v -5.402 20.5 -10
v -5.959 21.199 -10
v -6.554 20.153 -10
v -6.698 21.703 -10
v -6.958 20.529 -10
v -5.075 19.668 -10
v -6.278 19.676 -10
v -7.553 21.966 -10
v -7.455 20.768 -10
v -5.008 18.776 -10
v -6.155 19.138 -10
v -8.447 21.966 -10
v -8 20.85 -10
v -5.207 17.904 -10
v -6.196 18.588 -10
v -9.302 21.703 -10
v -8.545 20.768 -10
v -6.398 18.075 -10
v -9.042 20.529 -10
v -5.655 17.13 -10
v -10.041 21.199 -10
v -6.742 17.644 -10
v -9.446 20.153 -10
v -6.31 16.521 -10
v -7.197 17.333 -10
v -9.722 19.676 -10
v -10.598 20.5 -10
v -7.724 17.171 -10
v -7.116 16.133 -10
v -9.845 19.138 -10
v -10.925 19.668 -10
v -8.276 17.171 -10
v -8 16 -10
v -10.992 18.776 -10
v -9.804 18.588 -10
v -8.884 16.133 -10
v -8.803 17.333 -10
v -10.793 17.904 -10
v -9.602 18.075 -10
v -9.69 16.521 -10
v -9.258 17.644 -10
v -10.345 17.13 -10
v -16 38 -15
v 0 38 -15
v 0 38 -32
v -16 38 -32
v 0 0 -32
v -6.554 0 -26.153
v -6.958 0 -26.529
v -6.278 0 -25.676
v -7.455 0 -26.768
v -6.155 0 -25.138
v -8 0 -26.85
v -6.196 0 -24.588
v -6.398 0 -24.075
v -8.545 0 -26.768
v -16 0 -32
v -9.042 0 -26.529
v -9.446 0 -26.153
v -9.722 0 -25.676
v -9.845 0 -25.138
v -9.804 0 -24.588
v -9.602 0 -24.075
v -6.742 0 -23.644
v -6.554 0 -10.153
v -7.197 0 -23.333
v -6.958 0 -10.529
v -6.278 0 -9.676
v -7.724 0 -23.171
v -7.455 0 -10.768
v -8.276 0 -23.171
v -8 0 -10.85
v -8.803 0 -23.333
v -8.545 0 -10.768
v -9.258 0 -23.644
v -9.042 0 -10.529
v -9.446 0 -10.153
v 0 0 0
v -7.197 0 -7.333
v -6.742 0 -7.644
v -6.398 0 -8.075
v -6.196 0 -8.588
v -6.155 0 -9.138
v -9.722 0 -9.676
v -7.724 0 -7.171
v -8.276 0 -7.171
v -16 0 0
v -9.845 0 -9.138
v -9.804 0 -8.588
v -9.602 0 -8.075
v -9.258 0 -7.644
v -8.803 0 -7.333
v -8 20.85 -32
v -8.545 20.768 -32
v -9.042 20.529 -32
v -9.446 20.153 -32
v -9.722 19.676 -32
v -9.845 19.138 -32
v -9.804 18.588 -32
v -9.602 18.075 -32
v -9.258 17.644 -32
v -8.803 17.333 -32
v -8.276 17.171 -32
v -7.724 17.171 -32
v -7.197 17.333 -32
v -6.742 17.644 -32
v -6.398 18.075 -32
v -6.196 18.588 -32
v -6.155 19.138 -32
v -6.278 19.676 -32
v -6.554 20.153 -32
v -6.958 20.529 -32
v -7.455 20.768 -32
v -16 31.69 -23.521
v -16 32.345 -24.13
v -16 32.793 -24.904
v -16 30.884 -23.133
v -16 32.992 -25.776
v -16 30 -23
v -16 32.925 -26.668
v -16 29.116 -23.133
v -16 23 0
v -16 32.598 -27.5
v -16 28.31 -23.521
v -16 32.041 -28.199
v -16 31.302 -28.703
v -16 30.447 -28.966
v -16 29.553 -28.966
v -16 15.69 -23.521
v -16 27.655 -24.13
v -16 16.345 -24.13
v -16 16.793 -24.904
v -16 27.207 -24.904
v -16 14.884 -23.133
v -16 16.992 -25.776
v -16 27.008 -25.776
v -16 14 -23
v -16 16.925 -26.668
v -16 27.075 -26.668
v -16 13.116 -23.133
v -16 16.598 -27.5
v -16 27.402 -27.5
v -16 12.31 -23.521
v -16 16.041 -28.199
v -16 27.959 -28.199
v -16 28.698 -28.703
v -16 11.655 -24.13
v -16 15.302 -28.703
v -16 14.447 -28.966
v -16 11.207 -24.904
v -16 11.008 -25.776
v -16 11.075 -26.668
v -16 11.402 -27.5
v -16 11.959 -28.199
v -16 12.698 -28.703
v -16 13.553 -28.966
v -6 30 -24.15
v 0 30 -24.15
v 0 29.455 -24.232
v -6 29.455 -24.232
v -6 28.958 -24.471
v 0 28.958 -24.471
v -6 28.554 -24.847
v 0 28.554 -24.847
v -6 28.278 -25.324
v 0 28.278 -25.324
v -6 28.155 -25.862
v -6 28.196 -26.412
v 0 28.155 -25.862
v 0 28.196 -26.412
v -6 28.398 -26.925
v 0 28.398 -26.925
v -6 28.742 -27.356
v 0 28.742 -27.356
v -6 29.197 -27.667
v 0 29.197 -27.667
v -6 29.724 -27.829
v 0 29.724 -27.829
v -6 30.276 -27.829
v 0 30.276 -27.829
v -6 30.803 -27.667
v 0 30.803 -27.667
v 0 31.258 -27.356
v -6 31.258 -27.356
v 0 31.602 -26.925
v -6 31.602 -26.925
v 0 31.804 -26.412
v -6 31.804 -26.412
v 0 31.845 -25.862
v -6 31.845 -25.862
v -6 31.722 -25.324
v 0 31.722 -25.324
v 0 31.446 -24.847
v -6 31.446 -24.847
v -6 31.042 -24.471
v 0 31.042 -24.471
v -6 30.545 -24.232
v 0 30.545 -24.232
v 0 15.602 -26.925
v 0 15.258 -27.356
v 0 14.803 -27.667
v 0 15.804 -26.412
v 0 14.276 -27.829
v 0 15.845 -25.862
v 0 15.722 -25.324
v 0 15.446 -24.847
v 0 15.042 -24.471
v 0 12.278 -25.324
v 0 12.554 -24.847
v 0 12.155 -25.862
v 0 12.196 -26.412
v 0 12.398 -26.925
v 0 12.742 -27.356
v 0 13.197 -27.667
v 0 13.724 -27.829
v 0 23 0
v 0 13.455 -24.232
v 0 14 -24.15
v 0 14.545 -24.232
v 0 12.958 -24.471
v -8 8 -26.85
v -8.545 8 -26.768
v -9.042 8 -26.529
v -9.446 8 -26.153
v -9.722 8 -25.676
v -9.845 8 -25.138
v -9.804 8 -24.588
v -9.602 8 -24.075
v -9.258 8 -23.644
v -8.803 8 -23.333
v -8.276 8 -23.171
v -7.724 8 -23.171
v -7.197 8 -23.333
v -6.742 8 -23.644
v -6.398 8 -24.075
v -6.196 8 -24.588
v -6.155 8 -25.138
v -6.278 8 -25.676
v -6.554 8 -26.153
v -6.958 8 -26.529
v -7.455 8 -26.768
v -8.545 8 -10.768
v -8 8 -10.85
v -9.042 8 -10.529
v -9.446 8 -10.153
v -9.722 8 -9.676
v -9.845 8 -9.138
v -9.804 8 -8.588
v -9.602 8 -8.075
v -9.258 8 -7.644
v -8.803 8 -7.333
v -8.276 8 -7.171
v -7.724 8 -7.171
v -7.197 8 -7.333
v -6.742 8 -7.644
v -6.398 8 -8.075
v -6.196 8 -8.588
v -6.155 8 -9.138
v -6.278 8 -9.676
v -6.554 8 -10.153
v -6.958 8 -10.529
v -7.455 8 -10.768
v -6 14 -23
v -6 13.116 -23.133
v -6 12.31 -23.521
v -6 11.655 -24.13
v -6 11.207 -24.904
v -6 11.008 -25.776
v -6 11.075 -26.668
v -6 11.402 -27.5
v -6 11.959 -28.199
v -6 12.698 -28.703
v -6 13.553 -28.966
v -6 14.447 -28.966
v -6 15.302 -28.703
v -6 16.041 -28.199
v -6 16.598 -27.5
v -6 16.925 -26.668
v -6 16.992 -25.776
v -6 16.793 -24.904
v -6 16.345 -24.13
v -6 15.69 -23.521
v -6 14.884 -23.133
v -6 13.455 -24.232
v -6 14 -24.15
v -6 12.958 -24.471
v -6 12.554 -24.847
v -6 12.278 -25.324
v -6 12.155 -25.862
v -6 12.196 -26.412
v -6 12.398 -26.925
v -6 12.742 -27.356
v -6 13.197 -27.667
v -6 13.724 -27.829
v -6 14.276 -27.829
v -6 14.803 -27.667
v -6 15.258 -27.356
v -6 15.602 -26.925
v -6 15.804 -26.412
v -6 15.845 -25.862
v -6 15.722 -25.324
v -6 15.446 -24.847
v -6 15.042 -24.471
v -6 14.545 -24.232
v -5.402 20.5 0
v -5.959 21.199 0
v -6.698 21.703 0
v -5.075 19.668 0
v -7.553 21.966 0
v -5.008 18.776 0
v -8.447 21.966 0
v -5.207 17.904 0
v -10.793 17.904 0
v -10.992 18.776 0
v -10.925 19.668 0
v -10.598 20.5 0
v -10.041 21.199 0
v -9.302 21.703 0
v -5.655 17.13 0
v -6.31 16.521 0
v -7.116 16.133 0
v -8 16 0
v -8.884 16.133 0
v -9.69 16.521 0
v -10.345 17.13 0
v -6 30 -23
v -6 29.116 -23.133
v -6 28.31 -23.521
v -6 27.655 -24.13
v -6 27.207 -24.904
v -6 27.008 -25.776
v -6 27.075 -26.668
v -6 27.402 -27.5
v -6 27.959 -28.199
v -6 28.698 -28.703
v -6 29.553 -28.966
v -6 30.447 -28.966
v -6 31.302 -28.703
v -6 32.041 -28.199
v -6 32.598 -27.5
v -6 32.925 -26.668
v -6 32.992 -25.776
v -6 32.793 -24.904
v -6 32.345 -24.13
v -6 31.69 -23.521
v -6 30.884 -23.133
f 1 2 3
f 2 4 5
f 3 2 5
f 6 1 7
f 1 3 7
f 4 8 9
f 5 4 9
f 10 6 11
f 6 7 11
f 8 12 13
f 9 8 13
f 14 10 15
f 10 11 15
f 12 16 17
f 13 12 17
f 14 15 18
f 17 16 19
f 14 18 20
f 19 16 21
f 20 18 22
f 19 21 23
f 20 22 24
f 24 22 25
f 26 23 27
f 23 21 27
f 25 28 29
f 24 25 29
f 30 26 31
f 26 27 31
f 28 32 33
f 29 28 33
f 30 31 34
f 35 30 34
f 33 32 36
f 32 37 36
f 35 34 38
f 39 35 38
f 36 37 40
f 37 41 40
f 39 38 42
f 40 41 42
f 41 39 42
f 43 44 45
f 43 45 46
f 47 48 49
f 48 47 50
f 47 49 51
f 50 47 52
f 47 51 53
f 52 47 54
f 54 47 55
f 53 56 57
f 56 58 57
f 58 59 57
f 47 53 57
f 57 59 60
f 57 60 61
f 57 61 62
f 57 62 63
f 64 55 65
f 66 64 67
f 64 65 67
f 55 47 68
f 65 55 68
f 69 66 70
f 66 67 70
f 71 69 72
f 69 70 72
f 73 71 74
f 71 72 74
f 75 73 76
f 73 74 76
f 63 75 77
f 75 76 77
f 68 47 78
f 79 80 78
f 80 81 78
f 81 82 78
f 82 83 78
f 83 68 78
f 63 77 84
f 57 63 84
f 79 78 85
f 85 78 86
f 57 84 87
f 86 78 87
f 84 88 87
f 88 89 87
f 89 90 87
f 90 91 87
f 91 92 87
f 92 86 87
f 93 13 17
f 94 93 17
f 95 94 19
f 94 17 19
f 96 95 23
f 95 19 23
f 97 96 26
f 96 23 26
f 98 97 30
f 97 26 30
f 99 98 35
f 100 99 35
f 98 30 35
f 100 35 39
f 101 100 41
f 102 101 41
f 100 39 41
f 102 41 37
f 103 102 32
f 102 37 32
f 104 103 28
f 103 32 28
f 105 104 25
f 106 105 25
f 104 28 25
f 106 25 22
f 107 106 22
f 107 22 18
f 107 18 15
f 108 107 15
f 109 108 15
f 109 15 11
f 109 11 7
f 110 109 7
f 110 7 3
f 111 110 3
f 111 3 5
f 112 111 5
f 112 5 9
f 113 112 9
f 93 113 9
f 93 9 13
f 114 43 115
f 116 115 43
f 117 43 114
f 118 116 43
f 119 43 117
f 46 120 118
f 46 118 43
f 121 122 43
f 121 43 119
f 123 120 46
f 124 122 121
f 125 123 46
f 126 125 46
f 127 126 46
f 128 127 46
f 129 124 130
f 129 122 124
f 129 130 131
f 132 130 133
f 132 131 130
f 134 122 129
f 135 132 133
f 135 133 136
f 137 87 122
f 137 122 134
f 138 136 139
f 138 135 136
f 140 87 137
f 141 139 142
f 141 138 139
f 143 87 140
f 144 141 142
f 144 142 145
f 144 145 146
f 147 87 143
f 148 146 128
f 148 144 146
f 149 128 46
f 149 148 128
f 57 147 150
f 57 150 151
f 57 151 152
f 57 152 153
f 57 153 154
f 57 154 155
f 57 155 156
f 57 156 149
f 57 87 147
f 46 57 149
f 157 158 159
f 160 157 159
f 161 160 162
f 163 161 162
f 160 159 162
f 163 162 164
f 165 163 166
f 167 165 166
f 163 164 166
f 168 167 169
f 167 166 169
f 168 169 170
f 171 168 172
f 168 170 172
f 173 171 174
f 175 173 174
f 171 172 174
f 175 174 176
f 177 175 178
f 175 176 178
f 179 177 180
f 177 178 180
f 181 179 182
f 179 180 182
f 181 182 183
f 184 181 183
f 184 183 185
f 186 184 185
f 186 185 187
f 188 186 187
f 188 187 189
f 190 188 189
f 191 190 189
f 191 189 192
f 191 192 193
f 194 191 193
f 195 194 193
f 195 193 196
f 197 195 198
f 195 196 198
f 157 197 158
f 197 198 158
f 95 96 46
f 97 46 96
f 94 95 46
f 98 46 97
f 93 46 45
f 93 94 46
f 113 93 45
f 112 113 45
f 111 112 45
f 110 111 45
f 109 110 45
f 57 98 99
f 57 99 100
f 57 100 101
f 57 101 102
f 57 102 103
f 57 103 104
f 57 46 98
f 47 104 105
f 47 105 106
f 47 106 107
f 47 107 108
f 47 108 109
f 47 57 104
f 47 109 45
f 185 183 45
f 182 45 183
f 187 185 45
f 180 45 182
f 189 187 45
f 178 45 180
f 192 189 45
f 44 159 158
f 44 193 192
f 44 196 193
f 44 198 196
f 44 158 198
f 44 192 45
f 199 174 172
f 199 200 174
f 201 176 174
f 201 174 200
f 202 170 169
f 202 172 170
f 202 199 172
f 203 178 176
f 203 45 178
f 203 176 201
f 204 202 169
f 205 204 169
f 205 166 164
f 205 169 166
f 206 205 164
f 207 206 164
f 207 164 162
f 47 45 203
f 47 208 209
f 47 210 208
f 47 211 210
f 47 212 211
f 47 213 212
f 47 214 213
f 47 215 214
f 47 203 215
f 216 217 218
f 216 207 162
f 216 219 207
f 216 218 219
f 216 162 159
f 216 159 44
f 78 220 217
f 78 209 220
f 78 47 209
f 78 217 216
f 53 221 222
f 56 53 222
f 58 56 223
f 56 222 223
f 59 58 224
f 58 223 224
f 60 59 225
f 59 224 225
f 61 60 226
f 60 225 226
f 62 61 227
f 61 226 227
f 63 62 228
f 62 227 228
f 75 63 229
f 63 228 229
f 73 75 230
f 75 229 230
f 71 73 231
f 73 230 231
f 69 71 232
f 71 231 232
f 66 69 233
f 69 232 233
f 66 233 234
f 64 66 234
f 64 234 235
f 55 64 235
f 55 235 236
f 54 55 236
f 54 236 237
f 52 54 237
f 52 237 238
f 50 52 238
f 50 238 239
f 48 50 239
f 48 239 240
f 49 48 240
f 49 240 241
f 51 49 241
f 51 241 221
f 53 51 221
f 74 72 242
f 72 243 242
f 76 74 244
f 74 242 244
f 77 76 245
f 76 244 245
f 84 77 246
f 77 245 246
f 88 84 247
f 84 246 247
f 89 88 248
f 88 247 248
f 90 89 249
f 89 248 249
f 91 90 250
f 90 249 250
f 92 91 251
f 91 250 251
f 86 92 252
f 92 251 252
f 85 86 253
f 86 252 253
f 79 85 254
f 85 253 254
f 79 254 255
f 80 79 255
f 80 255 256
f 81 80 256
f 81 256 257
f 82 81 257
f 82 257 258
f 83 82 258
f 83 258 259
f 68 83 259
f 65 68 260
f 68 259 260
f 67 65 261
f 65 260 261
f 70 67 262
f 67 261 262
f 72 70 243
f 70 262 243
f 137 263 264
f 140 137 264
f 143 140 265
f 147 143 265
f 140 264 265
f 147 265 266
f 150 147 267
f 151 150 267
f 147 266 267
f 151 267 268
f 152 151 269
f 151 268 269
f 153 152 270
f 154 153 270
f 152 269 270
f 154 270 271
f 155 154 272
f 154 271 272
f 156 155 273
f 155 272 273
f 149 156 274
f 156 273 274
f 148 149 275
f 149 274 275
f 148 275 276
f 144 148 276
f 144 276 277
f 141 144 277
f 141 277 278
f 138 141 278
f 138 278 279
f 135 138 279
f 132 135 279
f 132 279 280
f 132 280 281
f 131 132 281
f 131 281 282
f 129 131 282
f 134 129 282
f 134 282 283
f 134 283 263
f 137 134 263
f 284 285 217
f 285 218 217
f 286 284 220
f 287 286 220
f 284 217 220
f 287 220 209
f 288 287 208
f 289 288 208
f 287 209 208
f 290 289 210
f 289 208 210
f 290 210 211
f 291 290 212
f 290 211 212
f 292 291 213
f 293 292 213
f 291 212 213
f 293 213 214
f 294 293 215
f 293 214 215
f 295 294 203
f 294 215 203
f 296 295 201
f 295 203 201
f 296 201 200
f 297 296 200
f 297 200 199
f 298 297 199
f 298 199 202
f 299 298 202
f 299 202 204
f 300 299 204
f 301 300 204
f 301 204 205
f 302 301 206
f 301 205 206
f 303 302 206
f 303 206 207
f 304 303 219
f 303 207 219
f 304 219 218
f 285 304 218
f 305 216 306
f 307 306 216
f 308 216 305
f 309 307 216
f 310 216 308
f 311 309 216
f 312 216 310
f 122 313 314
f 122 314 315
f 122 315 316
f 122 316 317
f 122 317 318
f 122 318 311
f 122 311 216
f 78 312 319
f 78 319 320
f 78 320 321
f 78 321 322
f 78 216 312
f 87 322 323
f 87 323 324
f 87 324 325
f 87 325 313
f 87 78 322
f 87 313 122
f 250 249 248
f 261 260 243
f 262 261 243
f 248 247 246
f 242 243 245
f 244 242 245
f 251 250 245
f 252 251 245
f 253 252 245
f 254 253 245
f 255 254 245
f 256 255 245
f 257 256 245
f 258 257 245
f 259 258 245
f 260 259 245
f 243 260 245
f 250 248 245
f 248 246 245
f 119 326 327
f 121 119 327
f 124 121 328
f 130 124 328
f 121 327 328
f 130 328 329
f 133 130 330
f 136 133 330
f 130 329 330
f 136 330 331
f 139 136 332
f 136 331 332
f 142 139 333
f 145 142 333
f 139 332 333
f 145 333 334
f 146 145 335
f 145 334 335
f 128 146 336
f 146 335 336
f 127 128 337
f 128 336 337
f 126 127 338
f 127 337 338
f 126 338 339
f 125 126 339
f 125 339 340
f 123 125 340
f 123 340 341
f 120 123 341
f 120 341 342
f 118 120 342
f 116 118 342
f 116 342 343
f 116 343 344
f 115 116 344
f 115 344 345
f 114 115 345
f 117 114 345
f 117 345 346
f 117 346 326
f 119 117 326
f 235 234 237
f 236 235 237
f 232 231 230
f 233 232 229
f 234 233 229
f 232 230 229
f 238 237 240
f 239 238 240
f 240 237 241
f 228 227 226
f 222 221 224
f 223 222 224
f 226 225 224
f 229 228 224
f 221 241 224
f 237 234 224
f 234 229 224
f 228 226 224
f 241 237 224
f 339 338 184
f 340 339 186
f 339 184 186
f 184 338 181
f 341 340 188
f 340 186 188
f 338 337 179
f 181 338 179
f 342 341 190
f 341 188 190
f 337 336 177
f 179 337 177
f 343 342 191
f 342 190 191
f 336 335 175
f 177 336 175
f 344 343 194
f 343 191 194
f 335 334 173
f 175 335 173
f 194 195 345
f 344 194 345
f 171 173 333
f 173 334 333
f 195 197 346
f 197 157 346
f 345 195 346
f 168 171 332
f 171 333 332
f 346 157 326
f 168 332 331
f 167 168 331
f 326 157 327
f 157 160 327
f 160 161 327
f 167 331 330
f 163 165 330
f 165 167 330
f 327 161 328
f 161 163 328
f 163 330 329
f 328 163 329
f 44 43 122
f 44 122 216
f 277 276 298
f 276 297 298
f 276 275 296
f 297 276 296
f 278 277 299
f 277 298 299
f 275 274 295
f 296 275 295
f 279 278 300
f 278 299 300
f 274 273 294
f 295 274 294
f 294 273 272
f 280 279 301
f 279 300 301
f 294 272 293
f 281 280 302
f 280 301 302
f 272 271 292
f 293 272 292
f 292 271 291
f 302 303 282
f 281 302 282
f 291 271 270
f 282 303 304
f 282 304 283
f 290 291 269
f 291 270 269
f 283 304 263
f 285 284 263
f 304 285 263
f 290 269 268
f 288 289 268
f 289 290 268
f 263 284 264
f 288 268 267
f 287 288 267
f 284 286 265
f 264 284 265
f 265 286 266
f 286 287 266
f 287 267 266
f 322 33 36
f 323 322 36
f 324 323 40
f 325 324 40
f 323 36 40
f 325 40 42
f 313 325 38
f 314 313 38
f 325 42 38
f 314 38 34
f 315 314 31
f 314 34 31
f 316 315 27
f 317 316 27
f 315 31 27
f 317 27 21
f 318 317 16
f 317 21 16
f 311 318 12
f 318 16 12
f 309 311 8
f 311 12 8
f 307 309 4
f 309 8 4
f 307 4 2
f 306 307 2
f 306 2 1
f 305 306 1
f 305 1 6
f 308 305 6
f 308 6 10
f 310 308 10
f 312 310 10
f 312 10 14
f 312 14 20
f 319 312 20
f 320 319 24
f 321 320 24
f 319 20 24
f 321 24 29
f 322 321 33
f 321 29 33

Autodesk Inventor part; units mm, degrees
ref_plane "YZ Plane" through (0, 0, 0) normal (1, 0, 0) x (0, 1, 0)
ref_plane "XZ Plane" through (0, 0, 0) normal (0, 1, 0) x (-1, 0, 0)
ref_plane "XY Plane" through (0, 0, 0) normal (0, 0, 1) x (1, 0, 0)
sketch "Sketch1" plane through (0, 0, 0) normal (0, 1, 0) x (-1, 0, 0)
  line L0 (0, 0) -> (16, 0)
  line L1 (16, 0) -> (16, -32)
  line L2 (16, -32) -> (0, -32)
  line L3 (0, -32) -> (0, 0)
  dimension "d0" = 16
  dimension "d1" = 32
extrude "Extrusion1" add sketch "Sketch1" along normal blind 38
sketch "Sketch2" plane through (-16, 0, -32) normal (-1, 0, 0) x (0, 0, 1)
  circle A0 centre (6, 14) radius 1.3525
  circle A1 centre (6, 30) radius 1.3525
  point P0 (32, 0)
hole "Hole1" at (-16, 14, -26) at (-16, 30, -26) direction (1, 0, 0) diameter 3.7 end through all counterbore diameter 6 counterbore depth 10
sketch "Sketch3" plane through (0, 0, 0) normal (0, -1, 0) x (1, 0, 0)
  circle A0 centre (-8, -25) radius 1.85
  circle A1 centre (-8, -9) radius 1.85
  point P0 (0, 0)
hole "Hole2" at (-8, 0, -25) at (-8, 0, -9) direction (0, 1, 0) diameter 3.7 depth 8
chamfer "Chamfer1" distance 15 angle 45 1 edges at (-8, 38, 0)
sketch "Sketch4" plane through (0, 0, -32) normal (0, 0, -1) x (-1, 0, 0)
  line L0 (0, 0) -> (16, 0)
  line L1 (16, 0) -> (16, 38)
  line L2 (0, 38) -> (16, 38)
  line L3 (0, 0) -> (0, 38)
  point P0 (8, 19)
hole "Hole3" at (-8, 19, -32) direction (0, 0, 1) diameter 3.7 end through all
sketch "Sketch6" plane through (-16, 0, 0) normal (0, 0, 1) x (1, 0, 0)
  circle A0 centre (8, 19) radius 1.85
  point P0 (16, 0)
hole "Hole5" at (-8, 19, 0) direction (0, 0, -1) diameter 6 depth 10
properties part number "innerbracket" material "ABS Plastic"
